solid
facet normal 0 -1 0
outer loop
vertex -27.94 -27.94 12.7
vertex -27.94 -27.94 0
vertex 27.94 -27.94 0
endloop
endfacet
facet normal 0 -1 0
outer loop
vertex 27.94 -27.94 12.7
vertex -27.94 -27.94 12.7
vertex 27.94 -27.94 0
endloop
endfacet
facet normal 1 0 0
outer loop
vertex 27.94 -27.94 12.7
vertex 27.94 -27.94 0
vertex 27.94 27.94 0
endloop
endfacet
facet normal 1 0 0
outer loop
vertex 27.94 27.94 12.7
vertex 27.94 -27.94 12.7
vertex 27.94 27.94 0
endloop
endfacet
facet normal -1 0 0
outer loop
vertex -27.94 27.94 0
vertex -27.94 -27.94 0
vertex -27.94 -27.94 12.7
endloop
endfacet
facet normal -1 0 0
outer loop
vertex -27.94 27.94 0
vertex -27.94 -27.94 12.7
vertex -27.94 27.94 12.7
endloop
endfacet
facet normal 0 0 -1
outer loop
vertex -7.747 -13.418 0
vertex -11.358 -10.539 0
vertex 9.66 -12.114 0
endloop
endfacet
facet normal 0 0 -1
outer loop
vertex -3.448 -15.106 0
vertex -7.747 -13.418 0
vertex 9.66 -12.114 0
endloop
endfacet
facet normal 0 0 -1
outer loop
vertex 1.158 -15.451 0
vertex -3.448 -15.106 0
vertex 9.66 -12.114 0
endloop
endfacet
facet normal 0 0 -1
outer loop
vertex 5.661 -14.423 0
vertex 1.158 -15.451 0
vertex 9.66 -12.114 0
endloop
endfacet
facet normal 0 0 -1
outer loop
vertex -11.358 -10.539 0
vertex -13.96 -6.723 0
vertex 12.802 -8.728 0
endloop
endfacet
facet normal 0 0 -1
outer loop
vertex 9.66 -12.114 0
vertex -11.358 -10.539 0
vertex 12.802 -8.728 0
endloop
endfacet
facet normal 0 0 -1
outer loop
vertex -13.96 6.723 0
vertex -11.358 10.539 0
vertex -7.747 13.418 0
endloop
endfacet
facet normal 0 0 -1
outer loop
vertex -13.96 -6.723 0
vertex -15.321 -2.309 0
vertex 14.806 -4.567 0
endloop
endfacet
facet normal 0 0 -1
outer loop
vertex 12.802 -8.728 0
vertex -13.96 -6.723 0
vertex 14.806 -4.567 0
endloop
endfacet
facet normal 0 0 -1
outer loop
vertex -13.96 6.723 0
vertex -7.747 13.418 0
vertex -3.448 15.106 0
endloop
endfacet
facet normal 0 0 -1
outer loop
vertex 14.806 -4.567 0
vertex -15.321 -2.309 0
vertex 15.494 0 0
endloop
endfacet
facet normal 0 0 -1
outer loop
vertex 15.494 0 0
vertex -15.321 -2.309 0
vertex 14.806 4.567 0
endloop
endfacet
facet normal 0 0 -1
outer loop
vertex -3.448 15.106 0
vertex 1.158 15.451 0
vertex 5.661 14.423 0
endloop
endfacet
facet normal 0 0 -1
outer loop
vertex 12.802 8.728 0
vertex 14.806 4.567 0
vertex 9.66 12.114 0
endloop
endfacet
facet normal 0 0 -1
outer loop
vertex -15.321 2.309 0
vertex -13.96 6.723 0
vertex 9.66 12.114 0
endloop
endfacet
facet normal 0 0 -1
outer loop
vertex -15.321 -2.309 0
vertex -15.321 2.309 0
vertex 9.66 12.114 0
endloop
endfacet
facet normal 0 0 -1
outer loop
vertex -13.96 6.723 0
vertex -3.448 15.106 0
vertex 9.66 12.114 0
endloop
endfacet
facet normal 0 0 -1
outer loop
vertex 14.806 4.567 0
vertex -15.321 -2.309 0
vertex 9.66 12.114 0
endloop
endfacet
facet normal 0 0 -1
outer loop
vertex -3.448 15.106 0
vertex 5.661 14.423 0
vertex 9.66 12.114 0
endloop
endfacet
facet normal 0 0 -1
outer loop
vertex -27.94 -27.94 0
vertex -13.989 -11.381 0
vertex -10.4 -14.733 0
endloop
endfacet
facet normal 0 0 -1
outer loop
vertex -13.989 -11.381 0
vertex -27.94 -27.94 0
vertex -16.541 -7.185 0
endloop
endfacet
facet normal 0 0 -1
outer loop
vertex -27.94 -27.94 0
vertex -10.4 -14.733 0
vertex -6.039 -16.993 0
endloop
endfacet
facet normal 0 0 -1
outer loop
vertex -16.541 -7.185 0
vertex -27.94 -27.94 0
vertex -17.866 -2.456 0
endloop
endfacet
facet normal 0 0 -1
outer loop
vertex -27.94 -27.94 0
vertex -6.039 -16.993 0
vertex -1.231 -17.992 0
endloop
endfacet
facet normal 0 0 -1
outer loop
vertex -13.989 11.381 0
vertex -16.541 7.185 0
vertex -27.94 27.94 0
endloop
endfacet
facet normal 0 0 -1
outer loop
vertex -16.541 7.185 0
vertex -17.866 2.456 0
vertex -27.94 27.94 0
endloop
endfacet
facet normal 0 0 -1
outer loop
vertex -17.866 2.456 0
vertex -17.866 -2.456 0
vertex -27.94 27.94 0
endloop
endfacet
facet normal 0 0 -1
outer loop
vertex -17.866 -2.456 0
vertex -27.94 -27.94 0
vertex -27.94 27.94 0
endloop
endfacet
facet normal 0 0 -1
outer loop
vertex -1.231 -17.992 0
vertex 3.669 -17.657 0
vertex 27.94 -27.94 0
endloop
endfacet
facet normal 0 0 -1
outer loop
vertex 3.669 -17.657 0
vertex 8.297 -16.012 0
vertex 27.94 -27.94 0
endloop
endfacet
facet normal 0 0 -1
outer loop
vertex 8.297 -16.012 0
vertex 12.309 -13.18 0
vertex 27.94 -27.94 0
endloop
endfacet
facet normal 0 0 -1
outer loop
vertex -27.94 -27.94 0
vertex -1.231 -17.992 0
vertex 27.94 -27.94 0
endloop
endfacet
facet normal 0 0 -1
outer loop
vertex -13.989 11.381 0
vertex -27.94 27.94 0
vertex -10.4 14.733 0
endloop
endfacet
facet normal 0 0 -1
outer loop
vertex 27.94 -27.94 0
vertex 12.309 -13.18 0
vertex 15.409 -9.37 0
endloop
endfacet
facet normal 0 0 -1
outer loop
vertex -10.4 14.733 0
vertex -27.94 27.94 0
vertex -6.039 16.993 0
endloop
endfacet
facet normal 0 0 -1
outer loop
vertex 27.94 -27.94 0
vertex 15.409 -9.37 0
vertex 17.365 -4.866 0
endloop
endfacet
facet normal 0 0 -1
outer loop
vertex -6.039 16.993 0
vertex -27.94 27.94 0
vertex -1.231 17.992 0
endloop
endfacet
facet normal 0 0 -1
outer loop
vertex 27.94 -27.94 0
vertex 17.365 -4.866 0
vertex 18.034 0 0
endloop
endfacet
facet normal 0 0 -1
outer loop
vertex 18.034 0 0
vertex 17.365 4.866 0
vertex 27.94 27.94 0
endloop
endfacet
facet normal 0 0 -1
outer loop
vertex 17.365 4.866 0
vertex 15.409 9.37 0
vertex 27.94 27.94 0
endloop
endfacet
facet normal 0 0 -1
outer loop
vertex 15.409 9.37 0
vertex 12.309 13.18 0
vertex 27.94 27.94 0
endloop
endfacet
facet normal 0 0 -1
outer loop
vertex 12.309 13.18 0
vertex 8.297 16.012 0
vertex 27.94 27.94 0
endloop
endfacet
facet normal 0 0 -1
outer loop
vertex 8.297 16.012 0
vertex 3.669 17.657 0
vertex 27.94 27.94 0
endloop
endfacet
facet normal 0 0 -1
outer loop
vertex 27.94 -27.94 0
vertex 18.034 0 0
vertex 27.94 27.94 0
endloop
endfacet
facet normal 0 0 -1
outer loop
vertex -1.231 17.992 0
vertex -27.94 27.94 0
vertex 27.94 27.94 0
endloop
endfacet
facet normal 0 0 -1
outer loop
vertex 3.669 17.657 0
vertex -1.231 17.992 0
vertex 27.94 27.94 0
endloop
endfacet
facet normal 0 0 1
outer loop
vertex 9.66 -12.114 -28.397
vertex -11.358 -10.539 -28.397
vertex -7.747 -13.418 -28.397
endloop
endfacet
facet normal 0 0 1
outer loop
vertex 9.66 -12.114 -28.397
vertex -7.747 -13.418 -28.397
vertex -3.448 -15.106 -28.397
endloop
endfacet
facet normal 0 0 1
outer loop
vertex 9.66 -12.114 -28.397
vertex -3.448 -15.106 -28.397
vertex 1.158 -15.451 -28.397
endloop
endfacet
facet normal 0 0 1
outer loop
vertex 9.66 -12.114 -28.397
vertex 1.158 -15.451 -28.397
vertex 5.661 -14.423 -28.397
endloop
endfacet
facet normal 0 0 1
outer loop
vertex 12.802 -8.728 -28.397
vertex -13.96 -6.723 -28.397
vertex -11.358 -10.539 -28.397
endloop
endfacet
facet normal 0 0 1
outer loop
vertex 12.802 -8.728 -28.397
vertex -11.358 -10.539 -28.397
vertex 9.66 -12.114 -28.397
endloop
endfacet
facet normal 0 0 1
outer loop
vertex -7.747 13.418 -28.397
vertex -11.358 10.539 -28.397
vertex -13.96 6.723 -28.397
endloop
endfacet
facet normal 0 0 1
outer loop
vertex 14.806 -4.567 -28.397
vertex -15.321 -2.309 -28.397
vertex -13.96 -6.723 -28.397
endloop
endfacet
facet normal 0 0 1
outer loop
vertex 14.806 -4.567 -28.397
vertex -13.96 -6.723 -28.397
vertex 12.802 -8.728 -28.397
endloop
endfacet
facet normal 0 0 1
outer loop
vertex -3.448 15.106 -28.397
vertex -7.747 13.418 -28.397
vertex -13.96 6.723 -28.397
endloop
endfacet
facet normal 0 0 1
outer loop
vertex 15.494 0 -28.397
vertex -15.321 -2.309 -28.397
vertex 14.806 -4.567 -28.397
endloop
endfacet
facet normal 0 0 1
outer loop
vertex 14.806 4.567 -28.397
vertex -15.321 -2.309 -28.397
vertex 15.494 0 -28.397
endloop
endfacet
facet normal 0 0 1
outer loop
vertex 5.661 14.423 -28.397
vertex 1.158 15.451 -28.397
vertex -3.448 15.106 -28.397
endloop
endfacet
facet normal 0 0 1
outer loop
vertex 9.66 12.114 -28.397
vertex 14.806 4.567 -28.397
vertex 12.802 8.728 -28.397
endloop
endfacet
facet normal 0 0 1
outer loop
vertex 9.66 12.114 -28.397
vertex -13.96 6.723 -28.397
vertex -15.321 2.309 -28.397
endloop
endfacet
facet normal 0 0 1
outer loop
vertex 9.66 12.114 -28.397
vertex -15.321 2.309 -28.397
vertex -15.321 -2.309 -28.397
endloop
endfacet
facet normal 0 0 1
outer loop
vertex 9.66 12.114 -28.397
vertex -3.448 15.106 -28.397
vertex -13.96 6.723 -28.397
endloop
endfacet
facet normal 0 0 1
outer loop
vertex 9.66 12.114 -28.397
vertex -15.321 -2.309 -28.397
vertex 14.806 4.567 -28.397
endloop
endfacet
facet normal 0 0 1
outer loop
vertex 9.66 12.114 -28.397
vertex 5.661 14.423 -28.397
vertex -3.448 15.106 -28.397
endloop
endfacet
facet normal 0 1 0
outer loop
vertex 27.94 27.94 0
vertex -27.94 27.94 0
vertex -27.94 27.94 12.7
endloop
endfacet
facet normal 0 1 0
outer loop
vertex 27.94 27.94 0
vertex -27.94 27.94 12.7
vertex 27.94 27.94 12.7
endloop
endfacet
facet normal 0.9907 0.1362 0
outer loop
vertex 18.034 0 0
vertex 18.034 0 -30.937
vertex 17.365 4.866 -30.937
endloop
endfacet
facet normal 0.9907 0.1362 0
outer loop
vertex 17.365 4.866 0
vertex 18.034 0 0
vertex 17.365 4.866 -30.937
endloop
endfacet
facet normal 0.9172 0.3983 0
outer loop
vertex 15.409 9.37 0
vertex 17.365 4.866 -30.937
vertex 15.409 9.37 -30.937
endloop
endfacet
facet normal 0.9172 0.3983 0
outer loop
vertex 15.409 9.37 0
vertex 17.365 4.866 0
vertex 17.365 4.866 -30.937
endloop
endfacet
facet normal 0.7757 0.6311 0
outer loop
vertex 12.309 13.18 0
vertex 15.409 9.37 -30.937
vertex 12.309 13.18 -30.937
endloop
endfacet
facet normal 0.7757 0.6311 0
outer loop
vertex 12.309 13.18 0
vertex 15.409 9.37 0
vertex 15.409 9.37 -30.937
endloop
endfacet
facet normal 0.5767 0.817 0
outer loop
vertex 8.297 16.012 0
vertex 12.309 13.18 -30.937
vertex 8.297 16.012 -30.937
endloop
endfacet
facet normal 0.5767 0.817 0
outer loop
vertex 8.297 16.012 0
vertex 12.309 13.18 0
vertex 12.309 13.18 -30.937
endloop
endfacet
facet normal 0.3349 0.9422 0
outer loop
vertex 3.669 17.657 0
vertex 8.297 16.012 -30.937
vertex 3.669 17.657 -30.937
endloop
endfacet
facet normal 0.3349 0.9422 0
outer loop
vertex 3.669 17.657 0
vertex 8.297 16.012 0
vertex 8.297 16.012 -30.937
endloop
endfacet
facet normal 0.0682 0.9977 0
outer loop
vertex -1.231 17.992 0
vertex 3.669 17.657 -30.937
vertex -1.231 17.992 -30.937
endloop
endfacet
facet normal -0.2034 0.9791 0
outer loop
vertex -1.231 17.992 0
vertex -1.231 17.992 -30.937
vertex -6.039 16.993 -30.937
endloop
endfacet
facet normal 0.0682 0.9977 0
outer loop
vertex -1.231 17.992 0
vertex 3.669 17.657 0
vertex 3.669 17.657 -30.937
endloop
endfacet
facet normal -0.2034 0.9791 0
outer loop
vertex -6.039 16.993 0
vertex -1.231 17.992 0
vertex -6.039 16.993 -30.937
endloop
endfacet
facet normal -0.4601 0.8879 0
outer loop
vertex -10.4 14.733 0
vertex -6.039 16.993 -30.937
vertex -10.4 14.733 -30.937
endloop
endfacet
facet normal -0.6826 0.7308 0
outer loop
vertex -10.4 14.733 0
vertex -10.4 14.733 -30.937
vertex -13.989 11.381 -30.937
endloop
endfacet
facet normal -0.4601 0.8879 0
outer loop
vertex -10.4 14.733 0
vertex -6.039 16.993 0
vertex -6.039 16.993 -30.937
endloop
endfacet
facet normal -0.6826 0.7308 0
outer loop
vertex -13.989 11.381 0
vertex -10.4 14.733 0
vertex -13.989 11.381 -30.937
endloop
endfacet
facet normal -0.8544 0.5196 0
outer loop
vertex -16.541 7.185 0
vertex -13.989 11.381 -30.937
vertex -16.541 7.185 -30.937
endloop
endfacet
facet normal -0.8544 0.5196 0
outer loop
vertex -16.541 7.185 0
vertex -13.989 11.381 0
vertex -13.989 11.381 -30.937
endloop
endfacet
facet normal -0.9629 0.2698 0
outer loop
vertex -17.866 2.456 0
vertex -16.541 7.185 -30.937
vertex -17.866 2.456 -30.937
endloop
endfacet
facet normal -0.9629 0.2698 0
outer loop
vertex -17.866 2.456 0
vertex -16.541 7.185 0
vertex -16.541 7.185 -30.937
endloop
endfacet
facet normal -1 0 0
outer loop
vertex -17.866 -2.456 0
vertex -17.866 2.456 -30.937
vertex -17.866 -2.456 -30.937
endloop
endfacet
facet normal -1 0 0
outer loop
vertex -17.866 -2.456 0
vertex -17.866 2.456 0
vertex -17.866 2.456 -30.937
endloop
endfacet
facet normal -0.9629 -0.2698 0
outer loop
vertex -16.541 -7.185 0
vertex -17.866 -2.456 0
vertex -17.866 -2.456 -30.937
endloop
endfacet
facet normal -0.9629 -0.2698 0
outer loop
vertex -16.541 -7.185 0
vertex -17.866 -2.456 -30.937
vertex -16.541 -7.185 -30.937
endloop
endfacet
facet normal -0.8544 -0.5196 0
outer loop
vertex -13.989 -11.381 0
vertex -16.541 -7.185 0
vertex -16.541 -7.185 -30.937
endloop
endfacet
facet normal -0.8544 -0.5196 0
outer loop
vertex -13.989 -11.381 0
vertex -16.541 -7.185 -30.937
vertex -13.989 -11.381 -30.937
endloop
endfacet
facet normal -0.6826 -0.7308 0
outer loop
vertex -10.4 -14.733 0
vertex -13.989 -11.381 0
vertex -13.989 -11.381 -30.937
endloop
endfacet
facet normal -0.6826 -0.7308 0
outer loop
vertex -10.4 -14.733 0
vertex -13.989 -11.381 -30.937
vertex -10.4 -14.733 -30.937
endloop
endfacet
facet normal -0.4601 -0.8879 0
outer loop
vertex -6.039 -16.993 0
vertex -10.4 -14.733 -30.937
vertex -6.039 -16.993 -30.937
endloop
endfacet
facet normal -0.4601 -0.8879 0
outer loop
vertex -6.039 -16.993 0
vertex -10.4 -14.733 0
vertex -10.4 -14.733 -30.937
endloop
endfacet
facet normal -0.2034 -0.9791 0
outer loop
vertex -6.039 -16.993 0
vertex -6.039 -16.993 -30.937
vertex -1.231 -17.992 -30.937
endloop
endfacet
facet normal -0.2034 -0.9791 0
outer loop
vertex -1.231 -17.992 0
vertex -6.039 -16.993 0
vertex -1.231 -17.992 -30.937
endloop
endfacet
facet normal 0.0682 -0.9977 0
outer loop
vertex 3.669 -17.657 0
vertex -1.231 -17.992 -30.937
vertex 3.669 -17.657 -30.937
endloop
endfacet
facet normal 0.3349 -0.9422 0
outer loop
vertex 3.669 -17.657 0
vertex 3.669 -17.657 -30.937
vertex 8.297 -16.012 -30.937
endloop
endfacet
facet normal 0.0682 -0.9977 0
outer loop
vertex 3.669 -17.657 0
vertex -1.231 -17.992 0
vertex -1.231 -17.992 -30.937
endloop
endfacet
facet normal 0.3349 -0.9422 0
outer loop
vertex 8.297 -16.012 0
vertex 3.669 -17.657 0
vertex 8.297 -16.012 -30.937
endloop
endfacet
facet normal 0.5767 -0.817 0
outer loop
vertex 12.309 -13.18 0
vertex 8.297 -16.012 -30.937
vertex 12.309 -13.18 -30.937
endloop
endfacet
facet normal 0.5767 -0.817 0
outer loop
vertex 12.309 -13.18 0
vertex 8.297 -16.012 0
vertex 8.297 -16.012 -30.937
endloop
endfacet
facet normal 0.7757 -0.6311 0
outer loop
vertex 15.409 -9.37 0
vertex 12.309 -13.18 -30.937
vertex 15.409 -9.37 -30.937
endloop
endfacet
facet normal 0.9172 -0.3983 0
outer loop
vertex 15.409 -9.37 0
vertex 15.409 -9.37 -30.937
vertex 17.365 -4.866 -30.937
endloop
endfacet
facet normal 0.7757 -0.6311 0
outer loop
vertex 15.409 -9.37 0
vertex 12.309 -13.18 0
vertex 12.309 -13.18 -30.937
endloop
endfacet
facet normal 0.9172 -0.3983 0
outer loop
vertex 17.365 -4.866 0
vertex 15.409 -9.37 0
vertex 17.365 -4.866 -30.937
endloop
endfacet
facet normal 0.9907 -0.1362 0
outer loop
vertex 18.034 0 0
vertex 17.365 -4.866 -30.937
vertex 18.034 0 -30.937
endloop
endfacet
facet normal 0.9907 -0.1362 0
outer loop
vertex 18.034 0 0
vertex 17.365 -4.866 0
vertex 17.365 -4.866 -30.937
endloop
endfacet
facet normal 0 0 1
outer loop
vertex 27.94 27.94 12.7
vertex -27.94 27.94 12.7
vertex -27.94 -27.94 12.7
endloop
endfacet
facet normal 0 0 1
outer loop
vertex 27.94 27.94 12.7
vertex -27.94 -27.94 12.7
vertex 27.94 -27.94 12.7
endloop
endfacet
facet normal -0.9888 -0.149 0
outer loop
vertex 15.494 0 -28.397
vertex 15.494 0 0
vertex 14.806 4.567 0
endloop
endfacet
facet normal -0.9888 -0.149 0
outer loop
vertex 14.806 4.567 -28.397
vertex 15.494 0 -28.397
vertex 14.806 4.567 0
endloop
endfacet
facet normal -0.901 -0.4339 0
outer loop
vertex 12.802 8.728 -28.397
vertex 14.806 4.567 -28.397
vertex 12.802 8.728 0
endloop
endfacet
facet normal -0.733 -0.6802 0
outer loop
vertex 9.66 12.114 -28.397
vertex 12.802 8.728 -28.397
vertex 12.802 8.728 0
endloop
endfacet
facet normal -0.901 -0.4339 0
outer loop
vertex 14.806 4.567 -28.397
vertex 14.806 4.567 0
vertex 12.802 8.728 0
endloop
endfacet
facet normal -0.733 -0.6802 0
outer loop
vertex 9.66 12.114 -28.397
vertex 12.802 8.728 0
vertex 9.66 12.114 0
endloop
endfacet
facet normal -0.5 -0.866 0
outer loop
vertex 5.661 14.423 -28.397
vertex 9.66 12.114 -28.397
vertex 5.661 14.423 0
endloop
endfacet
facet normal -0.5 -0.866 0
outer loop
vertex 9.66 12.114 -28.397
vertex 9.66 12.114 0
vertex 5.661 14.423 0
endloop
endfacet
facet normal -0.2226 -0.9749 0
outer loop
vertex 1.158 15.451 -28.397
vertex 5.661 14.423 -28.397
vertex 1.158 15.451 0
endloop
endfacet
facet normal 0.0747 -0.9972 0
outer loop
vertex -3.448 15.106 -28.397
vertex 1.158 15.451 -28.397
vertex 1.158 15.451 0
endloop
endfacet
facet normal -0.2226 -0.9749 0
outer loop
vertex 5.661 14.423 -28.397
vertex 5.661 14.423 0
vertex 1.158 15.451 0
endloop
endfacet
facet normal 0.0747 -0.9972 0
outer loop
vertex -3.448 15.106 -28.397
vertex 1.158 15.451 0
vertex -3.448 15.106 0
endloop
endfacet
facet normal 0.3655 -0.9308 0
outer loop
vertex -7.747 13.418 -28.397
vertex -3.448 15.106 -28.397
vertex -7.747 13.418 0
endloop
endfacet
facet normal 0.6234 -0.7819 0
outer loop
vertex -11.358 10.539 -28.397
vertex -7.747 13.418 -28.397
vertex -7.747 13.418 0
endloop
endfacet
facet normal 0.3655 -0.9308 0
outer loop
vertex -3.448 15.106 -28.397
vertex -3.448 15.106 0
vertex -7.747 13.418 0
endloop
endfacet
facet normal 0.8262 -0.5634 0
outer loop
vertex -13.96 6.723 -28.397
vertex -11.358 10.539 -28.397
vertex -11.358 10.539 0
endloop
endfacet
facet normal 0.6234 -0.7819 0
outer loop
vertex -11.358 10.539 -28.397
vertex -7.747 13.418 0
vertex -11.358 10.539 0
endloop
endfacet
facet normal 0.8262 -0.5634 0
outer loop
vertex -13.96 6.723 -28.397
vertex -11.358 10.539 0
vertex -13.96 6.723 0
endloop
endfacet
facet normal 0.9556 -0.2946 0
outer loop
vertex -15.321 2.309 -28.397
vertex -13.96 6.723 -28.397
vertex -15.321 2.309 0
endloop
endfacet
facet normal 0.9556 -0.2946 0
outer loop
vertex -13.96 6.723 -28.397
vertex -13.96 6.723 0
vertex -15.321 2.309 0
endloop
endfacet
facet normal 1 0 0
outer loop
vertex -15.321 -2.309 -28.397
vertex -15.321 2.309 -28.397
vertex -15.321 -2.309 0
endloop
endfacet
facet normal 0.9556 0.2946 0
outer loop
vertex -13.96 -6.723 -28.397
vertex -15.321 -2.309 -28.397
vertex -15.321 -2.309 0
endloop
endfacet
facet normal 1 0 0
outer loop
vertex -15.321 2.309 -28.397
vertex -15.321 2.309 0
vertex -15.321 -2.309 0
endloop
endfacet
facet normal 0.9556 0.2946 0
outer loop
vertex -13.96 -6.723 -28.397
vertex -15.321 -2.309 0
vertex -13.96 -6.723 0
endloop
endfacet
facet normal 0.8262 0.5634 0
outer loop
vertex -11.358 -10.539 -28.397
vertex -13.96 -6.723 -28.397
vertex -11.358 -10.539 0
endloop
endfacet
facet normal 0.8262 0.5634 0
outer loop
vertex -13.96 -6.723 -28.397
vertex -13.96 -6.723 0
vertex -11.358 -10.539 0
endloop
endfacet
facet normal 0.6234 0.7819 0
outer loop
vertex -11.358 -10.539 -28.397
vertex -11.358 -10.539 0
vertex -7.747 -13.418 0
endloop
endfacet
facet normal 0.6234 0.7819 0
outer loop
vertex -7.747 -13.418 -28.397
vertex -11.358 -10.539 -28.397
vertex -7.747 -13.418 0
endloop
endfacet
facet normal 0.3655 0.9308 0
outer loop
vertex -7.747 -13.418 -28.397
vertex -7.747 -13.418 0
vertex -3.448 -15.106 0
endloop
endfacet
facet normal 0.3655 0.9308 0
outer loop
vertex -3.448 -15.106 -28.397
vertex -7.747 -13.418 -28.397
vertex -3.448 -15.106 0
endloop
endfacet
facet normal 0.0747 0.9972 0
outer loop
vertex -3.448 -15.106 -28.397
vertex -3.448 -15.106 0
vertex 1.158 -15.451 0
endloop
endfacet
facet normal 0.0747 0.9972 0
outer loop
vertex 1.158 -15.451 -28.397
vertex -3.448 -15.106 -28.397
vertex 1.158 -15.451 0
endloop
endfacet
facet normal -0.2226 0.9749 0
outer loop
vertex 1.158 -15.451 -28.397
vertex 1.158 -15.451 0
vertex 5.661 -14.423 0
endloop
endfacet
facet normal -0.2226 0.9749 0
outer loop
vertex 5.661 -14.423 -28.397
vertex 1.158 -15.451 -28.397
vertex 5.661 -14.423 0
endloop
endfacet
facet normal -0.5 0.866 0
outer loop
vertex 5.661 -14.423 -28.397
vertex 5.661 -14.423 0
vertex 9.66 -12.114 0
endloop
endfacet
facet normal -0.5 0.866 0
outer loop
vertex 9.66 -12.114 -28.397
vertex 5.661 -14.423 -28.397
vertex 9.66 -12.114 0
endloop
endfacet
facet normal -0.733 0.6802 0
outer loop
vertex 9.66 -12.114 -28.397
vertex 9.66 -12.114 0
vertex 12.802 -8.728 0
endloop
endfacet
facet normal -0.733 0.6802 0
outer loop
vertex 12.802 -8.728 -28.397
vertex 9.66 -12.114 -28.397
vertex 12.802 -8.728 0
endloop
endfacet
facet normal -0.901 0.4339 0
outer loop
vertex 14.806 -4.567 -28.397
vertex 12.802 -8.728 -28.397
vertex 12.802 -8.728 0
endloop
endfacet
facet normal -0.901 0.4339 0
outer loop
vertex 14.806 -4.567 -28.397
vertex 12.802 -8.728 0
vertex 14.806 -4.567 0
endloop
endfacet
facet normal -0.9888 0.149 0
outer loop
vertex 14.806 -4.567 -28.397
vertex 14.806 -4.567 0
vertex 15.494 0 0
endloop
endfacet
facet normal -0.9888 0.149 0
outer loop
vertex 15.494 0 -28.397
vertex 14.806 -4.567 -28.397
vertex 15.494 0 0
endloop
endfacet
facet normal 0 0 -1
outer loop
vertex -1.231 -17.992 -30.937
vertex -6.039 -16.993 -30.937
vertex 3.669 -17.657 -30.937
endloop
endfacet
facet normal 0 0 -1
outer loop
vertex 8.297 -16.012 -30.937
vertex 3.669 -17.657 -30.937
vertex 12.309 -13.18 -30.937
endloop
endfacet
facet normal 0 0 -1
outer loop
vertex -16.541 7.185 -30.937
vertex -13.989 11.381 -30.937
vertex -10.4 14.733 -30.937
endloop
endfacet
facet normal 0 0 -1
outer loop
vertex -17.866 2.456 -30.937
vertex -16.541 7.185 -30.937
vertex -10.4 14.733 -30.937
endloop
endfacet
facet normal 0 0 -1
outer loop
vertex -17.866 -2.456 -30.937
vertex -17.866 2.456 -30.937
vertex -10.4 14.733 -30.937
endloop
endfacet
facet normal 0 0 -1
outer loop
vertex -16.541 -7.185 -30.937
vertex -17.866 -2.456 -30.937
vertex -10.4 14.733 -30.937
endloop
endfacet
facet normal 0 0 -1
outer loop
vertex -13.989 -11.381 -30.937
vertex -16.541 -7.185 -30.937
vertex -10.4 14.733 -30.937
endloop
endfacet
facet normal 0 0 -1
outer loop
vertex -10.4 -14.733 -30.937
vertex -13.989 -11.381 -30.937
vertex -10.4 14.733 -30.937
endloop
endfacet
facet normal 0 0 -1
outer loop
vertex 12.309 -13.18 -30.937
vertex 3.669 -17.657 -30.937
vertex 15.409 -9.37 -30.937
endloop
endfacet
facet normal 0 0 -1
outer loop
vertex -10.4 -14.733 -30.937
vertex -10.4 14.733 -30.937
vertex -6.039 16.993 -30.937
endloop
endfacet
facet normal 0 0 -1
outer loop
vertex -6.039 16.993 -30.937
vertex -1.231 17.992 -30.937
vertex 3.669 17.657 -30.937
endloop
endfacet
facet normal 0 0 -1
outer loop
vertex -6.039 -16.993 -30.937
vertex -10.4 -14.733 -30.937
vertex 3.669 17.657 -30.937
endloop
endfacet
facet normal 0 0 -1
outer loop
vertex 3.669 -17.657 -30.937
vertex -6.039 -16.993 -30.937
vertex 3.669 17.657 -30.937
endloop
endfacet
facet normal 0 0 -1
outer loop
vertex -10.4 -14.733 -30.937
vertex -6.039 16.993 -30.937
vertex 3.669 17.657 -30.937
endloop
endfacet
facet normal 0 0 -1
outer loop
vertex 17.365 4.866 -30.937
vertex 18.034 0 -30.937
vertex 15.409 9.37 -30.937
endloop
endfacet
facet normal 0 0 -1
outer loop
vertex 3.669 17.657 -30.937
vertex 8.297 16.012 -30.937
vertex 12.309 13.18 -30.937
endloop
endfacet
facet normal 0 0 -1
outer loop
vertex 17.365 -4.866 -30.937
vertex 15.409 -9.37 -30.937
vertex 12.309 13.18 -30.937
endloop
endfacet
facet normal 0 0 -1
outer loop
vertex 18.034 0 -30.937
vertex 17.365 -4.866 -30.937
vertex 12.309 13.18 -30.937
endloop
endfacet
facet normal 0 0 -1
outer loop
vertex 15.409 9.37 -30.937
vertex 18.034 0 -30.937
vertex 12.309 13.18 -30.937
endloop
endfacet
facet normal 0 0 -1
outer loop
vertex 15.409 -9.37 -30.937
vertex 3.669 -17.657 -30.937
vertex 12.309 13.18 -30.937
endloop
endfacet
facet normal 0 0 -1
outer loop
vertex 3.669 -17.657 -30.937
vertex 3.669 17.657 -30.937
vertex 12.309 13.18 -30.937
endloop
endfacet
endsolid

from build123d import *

# Parameters (mm, degrees)
F0_R     = 18.034
F1_DEPTH = 30.9372
F2_T     = -2.54
F0_W     = 55.88
F0_H     = 55.88
F3_DEPTH = 12.7


with BuildPart() as f1:
    # F0 (on Top) → F1 (new body)
    with BuildSketch(Plane.XY):
        Circle(F0_R)
    extrude(amount=-F1_DEPTH)

    # F2
    f2_openings = [f1.faces().sort_by_distance(p)[0] for p in [
        (0, 0, 0),
    ]]
    offset(amount=F2_T, openings=f2_openings)

    # F0 (on Top) → F3 (join)
    with BuildSketch(Plane.XY):
        Rectangle(F0_W, F0_H)
        Circle(F0_R, mode=Mode.SUBTRACT)
        Circle(F0_R)
    extrude(amount=F3_DEPTH)


solid = f1.part
